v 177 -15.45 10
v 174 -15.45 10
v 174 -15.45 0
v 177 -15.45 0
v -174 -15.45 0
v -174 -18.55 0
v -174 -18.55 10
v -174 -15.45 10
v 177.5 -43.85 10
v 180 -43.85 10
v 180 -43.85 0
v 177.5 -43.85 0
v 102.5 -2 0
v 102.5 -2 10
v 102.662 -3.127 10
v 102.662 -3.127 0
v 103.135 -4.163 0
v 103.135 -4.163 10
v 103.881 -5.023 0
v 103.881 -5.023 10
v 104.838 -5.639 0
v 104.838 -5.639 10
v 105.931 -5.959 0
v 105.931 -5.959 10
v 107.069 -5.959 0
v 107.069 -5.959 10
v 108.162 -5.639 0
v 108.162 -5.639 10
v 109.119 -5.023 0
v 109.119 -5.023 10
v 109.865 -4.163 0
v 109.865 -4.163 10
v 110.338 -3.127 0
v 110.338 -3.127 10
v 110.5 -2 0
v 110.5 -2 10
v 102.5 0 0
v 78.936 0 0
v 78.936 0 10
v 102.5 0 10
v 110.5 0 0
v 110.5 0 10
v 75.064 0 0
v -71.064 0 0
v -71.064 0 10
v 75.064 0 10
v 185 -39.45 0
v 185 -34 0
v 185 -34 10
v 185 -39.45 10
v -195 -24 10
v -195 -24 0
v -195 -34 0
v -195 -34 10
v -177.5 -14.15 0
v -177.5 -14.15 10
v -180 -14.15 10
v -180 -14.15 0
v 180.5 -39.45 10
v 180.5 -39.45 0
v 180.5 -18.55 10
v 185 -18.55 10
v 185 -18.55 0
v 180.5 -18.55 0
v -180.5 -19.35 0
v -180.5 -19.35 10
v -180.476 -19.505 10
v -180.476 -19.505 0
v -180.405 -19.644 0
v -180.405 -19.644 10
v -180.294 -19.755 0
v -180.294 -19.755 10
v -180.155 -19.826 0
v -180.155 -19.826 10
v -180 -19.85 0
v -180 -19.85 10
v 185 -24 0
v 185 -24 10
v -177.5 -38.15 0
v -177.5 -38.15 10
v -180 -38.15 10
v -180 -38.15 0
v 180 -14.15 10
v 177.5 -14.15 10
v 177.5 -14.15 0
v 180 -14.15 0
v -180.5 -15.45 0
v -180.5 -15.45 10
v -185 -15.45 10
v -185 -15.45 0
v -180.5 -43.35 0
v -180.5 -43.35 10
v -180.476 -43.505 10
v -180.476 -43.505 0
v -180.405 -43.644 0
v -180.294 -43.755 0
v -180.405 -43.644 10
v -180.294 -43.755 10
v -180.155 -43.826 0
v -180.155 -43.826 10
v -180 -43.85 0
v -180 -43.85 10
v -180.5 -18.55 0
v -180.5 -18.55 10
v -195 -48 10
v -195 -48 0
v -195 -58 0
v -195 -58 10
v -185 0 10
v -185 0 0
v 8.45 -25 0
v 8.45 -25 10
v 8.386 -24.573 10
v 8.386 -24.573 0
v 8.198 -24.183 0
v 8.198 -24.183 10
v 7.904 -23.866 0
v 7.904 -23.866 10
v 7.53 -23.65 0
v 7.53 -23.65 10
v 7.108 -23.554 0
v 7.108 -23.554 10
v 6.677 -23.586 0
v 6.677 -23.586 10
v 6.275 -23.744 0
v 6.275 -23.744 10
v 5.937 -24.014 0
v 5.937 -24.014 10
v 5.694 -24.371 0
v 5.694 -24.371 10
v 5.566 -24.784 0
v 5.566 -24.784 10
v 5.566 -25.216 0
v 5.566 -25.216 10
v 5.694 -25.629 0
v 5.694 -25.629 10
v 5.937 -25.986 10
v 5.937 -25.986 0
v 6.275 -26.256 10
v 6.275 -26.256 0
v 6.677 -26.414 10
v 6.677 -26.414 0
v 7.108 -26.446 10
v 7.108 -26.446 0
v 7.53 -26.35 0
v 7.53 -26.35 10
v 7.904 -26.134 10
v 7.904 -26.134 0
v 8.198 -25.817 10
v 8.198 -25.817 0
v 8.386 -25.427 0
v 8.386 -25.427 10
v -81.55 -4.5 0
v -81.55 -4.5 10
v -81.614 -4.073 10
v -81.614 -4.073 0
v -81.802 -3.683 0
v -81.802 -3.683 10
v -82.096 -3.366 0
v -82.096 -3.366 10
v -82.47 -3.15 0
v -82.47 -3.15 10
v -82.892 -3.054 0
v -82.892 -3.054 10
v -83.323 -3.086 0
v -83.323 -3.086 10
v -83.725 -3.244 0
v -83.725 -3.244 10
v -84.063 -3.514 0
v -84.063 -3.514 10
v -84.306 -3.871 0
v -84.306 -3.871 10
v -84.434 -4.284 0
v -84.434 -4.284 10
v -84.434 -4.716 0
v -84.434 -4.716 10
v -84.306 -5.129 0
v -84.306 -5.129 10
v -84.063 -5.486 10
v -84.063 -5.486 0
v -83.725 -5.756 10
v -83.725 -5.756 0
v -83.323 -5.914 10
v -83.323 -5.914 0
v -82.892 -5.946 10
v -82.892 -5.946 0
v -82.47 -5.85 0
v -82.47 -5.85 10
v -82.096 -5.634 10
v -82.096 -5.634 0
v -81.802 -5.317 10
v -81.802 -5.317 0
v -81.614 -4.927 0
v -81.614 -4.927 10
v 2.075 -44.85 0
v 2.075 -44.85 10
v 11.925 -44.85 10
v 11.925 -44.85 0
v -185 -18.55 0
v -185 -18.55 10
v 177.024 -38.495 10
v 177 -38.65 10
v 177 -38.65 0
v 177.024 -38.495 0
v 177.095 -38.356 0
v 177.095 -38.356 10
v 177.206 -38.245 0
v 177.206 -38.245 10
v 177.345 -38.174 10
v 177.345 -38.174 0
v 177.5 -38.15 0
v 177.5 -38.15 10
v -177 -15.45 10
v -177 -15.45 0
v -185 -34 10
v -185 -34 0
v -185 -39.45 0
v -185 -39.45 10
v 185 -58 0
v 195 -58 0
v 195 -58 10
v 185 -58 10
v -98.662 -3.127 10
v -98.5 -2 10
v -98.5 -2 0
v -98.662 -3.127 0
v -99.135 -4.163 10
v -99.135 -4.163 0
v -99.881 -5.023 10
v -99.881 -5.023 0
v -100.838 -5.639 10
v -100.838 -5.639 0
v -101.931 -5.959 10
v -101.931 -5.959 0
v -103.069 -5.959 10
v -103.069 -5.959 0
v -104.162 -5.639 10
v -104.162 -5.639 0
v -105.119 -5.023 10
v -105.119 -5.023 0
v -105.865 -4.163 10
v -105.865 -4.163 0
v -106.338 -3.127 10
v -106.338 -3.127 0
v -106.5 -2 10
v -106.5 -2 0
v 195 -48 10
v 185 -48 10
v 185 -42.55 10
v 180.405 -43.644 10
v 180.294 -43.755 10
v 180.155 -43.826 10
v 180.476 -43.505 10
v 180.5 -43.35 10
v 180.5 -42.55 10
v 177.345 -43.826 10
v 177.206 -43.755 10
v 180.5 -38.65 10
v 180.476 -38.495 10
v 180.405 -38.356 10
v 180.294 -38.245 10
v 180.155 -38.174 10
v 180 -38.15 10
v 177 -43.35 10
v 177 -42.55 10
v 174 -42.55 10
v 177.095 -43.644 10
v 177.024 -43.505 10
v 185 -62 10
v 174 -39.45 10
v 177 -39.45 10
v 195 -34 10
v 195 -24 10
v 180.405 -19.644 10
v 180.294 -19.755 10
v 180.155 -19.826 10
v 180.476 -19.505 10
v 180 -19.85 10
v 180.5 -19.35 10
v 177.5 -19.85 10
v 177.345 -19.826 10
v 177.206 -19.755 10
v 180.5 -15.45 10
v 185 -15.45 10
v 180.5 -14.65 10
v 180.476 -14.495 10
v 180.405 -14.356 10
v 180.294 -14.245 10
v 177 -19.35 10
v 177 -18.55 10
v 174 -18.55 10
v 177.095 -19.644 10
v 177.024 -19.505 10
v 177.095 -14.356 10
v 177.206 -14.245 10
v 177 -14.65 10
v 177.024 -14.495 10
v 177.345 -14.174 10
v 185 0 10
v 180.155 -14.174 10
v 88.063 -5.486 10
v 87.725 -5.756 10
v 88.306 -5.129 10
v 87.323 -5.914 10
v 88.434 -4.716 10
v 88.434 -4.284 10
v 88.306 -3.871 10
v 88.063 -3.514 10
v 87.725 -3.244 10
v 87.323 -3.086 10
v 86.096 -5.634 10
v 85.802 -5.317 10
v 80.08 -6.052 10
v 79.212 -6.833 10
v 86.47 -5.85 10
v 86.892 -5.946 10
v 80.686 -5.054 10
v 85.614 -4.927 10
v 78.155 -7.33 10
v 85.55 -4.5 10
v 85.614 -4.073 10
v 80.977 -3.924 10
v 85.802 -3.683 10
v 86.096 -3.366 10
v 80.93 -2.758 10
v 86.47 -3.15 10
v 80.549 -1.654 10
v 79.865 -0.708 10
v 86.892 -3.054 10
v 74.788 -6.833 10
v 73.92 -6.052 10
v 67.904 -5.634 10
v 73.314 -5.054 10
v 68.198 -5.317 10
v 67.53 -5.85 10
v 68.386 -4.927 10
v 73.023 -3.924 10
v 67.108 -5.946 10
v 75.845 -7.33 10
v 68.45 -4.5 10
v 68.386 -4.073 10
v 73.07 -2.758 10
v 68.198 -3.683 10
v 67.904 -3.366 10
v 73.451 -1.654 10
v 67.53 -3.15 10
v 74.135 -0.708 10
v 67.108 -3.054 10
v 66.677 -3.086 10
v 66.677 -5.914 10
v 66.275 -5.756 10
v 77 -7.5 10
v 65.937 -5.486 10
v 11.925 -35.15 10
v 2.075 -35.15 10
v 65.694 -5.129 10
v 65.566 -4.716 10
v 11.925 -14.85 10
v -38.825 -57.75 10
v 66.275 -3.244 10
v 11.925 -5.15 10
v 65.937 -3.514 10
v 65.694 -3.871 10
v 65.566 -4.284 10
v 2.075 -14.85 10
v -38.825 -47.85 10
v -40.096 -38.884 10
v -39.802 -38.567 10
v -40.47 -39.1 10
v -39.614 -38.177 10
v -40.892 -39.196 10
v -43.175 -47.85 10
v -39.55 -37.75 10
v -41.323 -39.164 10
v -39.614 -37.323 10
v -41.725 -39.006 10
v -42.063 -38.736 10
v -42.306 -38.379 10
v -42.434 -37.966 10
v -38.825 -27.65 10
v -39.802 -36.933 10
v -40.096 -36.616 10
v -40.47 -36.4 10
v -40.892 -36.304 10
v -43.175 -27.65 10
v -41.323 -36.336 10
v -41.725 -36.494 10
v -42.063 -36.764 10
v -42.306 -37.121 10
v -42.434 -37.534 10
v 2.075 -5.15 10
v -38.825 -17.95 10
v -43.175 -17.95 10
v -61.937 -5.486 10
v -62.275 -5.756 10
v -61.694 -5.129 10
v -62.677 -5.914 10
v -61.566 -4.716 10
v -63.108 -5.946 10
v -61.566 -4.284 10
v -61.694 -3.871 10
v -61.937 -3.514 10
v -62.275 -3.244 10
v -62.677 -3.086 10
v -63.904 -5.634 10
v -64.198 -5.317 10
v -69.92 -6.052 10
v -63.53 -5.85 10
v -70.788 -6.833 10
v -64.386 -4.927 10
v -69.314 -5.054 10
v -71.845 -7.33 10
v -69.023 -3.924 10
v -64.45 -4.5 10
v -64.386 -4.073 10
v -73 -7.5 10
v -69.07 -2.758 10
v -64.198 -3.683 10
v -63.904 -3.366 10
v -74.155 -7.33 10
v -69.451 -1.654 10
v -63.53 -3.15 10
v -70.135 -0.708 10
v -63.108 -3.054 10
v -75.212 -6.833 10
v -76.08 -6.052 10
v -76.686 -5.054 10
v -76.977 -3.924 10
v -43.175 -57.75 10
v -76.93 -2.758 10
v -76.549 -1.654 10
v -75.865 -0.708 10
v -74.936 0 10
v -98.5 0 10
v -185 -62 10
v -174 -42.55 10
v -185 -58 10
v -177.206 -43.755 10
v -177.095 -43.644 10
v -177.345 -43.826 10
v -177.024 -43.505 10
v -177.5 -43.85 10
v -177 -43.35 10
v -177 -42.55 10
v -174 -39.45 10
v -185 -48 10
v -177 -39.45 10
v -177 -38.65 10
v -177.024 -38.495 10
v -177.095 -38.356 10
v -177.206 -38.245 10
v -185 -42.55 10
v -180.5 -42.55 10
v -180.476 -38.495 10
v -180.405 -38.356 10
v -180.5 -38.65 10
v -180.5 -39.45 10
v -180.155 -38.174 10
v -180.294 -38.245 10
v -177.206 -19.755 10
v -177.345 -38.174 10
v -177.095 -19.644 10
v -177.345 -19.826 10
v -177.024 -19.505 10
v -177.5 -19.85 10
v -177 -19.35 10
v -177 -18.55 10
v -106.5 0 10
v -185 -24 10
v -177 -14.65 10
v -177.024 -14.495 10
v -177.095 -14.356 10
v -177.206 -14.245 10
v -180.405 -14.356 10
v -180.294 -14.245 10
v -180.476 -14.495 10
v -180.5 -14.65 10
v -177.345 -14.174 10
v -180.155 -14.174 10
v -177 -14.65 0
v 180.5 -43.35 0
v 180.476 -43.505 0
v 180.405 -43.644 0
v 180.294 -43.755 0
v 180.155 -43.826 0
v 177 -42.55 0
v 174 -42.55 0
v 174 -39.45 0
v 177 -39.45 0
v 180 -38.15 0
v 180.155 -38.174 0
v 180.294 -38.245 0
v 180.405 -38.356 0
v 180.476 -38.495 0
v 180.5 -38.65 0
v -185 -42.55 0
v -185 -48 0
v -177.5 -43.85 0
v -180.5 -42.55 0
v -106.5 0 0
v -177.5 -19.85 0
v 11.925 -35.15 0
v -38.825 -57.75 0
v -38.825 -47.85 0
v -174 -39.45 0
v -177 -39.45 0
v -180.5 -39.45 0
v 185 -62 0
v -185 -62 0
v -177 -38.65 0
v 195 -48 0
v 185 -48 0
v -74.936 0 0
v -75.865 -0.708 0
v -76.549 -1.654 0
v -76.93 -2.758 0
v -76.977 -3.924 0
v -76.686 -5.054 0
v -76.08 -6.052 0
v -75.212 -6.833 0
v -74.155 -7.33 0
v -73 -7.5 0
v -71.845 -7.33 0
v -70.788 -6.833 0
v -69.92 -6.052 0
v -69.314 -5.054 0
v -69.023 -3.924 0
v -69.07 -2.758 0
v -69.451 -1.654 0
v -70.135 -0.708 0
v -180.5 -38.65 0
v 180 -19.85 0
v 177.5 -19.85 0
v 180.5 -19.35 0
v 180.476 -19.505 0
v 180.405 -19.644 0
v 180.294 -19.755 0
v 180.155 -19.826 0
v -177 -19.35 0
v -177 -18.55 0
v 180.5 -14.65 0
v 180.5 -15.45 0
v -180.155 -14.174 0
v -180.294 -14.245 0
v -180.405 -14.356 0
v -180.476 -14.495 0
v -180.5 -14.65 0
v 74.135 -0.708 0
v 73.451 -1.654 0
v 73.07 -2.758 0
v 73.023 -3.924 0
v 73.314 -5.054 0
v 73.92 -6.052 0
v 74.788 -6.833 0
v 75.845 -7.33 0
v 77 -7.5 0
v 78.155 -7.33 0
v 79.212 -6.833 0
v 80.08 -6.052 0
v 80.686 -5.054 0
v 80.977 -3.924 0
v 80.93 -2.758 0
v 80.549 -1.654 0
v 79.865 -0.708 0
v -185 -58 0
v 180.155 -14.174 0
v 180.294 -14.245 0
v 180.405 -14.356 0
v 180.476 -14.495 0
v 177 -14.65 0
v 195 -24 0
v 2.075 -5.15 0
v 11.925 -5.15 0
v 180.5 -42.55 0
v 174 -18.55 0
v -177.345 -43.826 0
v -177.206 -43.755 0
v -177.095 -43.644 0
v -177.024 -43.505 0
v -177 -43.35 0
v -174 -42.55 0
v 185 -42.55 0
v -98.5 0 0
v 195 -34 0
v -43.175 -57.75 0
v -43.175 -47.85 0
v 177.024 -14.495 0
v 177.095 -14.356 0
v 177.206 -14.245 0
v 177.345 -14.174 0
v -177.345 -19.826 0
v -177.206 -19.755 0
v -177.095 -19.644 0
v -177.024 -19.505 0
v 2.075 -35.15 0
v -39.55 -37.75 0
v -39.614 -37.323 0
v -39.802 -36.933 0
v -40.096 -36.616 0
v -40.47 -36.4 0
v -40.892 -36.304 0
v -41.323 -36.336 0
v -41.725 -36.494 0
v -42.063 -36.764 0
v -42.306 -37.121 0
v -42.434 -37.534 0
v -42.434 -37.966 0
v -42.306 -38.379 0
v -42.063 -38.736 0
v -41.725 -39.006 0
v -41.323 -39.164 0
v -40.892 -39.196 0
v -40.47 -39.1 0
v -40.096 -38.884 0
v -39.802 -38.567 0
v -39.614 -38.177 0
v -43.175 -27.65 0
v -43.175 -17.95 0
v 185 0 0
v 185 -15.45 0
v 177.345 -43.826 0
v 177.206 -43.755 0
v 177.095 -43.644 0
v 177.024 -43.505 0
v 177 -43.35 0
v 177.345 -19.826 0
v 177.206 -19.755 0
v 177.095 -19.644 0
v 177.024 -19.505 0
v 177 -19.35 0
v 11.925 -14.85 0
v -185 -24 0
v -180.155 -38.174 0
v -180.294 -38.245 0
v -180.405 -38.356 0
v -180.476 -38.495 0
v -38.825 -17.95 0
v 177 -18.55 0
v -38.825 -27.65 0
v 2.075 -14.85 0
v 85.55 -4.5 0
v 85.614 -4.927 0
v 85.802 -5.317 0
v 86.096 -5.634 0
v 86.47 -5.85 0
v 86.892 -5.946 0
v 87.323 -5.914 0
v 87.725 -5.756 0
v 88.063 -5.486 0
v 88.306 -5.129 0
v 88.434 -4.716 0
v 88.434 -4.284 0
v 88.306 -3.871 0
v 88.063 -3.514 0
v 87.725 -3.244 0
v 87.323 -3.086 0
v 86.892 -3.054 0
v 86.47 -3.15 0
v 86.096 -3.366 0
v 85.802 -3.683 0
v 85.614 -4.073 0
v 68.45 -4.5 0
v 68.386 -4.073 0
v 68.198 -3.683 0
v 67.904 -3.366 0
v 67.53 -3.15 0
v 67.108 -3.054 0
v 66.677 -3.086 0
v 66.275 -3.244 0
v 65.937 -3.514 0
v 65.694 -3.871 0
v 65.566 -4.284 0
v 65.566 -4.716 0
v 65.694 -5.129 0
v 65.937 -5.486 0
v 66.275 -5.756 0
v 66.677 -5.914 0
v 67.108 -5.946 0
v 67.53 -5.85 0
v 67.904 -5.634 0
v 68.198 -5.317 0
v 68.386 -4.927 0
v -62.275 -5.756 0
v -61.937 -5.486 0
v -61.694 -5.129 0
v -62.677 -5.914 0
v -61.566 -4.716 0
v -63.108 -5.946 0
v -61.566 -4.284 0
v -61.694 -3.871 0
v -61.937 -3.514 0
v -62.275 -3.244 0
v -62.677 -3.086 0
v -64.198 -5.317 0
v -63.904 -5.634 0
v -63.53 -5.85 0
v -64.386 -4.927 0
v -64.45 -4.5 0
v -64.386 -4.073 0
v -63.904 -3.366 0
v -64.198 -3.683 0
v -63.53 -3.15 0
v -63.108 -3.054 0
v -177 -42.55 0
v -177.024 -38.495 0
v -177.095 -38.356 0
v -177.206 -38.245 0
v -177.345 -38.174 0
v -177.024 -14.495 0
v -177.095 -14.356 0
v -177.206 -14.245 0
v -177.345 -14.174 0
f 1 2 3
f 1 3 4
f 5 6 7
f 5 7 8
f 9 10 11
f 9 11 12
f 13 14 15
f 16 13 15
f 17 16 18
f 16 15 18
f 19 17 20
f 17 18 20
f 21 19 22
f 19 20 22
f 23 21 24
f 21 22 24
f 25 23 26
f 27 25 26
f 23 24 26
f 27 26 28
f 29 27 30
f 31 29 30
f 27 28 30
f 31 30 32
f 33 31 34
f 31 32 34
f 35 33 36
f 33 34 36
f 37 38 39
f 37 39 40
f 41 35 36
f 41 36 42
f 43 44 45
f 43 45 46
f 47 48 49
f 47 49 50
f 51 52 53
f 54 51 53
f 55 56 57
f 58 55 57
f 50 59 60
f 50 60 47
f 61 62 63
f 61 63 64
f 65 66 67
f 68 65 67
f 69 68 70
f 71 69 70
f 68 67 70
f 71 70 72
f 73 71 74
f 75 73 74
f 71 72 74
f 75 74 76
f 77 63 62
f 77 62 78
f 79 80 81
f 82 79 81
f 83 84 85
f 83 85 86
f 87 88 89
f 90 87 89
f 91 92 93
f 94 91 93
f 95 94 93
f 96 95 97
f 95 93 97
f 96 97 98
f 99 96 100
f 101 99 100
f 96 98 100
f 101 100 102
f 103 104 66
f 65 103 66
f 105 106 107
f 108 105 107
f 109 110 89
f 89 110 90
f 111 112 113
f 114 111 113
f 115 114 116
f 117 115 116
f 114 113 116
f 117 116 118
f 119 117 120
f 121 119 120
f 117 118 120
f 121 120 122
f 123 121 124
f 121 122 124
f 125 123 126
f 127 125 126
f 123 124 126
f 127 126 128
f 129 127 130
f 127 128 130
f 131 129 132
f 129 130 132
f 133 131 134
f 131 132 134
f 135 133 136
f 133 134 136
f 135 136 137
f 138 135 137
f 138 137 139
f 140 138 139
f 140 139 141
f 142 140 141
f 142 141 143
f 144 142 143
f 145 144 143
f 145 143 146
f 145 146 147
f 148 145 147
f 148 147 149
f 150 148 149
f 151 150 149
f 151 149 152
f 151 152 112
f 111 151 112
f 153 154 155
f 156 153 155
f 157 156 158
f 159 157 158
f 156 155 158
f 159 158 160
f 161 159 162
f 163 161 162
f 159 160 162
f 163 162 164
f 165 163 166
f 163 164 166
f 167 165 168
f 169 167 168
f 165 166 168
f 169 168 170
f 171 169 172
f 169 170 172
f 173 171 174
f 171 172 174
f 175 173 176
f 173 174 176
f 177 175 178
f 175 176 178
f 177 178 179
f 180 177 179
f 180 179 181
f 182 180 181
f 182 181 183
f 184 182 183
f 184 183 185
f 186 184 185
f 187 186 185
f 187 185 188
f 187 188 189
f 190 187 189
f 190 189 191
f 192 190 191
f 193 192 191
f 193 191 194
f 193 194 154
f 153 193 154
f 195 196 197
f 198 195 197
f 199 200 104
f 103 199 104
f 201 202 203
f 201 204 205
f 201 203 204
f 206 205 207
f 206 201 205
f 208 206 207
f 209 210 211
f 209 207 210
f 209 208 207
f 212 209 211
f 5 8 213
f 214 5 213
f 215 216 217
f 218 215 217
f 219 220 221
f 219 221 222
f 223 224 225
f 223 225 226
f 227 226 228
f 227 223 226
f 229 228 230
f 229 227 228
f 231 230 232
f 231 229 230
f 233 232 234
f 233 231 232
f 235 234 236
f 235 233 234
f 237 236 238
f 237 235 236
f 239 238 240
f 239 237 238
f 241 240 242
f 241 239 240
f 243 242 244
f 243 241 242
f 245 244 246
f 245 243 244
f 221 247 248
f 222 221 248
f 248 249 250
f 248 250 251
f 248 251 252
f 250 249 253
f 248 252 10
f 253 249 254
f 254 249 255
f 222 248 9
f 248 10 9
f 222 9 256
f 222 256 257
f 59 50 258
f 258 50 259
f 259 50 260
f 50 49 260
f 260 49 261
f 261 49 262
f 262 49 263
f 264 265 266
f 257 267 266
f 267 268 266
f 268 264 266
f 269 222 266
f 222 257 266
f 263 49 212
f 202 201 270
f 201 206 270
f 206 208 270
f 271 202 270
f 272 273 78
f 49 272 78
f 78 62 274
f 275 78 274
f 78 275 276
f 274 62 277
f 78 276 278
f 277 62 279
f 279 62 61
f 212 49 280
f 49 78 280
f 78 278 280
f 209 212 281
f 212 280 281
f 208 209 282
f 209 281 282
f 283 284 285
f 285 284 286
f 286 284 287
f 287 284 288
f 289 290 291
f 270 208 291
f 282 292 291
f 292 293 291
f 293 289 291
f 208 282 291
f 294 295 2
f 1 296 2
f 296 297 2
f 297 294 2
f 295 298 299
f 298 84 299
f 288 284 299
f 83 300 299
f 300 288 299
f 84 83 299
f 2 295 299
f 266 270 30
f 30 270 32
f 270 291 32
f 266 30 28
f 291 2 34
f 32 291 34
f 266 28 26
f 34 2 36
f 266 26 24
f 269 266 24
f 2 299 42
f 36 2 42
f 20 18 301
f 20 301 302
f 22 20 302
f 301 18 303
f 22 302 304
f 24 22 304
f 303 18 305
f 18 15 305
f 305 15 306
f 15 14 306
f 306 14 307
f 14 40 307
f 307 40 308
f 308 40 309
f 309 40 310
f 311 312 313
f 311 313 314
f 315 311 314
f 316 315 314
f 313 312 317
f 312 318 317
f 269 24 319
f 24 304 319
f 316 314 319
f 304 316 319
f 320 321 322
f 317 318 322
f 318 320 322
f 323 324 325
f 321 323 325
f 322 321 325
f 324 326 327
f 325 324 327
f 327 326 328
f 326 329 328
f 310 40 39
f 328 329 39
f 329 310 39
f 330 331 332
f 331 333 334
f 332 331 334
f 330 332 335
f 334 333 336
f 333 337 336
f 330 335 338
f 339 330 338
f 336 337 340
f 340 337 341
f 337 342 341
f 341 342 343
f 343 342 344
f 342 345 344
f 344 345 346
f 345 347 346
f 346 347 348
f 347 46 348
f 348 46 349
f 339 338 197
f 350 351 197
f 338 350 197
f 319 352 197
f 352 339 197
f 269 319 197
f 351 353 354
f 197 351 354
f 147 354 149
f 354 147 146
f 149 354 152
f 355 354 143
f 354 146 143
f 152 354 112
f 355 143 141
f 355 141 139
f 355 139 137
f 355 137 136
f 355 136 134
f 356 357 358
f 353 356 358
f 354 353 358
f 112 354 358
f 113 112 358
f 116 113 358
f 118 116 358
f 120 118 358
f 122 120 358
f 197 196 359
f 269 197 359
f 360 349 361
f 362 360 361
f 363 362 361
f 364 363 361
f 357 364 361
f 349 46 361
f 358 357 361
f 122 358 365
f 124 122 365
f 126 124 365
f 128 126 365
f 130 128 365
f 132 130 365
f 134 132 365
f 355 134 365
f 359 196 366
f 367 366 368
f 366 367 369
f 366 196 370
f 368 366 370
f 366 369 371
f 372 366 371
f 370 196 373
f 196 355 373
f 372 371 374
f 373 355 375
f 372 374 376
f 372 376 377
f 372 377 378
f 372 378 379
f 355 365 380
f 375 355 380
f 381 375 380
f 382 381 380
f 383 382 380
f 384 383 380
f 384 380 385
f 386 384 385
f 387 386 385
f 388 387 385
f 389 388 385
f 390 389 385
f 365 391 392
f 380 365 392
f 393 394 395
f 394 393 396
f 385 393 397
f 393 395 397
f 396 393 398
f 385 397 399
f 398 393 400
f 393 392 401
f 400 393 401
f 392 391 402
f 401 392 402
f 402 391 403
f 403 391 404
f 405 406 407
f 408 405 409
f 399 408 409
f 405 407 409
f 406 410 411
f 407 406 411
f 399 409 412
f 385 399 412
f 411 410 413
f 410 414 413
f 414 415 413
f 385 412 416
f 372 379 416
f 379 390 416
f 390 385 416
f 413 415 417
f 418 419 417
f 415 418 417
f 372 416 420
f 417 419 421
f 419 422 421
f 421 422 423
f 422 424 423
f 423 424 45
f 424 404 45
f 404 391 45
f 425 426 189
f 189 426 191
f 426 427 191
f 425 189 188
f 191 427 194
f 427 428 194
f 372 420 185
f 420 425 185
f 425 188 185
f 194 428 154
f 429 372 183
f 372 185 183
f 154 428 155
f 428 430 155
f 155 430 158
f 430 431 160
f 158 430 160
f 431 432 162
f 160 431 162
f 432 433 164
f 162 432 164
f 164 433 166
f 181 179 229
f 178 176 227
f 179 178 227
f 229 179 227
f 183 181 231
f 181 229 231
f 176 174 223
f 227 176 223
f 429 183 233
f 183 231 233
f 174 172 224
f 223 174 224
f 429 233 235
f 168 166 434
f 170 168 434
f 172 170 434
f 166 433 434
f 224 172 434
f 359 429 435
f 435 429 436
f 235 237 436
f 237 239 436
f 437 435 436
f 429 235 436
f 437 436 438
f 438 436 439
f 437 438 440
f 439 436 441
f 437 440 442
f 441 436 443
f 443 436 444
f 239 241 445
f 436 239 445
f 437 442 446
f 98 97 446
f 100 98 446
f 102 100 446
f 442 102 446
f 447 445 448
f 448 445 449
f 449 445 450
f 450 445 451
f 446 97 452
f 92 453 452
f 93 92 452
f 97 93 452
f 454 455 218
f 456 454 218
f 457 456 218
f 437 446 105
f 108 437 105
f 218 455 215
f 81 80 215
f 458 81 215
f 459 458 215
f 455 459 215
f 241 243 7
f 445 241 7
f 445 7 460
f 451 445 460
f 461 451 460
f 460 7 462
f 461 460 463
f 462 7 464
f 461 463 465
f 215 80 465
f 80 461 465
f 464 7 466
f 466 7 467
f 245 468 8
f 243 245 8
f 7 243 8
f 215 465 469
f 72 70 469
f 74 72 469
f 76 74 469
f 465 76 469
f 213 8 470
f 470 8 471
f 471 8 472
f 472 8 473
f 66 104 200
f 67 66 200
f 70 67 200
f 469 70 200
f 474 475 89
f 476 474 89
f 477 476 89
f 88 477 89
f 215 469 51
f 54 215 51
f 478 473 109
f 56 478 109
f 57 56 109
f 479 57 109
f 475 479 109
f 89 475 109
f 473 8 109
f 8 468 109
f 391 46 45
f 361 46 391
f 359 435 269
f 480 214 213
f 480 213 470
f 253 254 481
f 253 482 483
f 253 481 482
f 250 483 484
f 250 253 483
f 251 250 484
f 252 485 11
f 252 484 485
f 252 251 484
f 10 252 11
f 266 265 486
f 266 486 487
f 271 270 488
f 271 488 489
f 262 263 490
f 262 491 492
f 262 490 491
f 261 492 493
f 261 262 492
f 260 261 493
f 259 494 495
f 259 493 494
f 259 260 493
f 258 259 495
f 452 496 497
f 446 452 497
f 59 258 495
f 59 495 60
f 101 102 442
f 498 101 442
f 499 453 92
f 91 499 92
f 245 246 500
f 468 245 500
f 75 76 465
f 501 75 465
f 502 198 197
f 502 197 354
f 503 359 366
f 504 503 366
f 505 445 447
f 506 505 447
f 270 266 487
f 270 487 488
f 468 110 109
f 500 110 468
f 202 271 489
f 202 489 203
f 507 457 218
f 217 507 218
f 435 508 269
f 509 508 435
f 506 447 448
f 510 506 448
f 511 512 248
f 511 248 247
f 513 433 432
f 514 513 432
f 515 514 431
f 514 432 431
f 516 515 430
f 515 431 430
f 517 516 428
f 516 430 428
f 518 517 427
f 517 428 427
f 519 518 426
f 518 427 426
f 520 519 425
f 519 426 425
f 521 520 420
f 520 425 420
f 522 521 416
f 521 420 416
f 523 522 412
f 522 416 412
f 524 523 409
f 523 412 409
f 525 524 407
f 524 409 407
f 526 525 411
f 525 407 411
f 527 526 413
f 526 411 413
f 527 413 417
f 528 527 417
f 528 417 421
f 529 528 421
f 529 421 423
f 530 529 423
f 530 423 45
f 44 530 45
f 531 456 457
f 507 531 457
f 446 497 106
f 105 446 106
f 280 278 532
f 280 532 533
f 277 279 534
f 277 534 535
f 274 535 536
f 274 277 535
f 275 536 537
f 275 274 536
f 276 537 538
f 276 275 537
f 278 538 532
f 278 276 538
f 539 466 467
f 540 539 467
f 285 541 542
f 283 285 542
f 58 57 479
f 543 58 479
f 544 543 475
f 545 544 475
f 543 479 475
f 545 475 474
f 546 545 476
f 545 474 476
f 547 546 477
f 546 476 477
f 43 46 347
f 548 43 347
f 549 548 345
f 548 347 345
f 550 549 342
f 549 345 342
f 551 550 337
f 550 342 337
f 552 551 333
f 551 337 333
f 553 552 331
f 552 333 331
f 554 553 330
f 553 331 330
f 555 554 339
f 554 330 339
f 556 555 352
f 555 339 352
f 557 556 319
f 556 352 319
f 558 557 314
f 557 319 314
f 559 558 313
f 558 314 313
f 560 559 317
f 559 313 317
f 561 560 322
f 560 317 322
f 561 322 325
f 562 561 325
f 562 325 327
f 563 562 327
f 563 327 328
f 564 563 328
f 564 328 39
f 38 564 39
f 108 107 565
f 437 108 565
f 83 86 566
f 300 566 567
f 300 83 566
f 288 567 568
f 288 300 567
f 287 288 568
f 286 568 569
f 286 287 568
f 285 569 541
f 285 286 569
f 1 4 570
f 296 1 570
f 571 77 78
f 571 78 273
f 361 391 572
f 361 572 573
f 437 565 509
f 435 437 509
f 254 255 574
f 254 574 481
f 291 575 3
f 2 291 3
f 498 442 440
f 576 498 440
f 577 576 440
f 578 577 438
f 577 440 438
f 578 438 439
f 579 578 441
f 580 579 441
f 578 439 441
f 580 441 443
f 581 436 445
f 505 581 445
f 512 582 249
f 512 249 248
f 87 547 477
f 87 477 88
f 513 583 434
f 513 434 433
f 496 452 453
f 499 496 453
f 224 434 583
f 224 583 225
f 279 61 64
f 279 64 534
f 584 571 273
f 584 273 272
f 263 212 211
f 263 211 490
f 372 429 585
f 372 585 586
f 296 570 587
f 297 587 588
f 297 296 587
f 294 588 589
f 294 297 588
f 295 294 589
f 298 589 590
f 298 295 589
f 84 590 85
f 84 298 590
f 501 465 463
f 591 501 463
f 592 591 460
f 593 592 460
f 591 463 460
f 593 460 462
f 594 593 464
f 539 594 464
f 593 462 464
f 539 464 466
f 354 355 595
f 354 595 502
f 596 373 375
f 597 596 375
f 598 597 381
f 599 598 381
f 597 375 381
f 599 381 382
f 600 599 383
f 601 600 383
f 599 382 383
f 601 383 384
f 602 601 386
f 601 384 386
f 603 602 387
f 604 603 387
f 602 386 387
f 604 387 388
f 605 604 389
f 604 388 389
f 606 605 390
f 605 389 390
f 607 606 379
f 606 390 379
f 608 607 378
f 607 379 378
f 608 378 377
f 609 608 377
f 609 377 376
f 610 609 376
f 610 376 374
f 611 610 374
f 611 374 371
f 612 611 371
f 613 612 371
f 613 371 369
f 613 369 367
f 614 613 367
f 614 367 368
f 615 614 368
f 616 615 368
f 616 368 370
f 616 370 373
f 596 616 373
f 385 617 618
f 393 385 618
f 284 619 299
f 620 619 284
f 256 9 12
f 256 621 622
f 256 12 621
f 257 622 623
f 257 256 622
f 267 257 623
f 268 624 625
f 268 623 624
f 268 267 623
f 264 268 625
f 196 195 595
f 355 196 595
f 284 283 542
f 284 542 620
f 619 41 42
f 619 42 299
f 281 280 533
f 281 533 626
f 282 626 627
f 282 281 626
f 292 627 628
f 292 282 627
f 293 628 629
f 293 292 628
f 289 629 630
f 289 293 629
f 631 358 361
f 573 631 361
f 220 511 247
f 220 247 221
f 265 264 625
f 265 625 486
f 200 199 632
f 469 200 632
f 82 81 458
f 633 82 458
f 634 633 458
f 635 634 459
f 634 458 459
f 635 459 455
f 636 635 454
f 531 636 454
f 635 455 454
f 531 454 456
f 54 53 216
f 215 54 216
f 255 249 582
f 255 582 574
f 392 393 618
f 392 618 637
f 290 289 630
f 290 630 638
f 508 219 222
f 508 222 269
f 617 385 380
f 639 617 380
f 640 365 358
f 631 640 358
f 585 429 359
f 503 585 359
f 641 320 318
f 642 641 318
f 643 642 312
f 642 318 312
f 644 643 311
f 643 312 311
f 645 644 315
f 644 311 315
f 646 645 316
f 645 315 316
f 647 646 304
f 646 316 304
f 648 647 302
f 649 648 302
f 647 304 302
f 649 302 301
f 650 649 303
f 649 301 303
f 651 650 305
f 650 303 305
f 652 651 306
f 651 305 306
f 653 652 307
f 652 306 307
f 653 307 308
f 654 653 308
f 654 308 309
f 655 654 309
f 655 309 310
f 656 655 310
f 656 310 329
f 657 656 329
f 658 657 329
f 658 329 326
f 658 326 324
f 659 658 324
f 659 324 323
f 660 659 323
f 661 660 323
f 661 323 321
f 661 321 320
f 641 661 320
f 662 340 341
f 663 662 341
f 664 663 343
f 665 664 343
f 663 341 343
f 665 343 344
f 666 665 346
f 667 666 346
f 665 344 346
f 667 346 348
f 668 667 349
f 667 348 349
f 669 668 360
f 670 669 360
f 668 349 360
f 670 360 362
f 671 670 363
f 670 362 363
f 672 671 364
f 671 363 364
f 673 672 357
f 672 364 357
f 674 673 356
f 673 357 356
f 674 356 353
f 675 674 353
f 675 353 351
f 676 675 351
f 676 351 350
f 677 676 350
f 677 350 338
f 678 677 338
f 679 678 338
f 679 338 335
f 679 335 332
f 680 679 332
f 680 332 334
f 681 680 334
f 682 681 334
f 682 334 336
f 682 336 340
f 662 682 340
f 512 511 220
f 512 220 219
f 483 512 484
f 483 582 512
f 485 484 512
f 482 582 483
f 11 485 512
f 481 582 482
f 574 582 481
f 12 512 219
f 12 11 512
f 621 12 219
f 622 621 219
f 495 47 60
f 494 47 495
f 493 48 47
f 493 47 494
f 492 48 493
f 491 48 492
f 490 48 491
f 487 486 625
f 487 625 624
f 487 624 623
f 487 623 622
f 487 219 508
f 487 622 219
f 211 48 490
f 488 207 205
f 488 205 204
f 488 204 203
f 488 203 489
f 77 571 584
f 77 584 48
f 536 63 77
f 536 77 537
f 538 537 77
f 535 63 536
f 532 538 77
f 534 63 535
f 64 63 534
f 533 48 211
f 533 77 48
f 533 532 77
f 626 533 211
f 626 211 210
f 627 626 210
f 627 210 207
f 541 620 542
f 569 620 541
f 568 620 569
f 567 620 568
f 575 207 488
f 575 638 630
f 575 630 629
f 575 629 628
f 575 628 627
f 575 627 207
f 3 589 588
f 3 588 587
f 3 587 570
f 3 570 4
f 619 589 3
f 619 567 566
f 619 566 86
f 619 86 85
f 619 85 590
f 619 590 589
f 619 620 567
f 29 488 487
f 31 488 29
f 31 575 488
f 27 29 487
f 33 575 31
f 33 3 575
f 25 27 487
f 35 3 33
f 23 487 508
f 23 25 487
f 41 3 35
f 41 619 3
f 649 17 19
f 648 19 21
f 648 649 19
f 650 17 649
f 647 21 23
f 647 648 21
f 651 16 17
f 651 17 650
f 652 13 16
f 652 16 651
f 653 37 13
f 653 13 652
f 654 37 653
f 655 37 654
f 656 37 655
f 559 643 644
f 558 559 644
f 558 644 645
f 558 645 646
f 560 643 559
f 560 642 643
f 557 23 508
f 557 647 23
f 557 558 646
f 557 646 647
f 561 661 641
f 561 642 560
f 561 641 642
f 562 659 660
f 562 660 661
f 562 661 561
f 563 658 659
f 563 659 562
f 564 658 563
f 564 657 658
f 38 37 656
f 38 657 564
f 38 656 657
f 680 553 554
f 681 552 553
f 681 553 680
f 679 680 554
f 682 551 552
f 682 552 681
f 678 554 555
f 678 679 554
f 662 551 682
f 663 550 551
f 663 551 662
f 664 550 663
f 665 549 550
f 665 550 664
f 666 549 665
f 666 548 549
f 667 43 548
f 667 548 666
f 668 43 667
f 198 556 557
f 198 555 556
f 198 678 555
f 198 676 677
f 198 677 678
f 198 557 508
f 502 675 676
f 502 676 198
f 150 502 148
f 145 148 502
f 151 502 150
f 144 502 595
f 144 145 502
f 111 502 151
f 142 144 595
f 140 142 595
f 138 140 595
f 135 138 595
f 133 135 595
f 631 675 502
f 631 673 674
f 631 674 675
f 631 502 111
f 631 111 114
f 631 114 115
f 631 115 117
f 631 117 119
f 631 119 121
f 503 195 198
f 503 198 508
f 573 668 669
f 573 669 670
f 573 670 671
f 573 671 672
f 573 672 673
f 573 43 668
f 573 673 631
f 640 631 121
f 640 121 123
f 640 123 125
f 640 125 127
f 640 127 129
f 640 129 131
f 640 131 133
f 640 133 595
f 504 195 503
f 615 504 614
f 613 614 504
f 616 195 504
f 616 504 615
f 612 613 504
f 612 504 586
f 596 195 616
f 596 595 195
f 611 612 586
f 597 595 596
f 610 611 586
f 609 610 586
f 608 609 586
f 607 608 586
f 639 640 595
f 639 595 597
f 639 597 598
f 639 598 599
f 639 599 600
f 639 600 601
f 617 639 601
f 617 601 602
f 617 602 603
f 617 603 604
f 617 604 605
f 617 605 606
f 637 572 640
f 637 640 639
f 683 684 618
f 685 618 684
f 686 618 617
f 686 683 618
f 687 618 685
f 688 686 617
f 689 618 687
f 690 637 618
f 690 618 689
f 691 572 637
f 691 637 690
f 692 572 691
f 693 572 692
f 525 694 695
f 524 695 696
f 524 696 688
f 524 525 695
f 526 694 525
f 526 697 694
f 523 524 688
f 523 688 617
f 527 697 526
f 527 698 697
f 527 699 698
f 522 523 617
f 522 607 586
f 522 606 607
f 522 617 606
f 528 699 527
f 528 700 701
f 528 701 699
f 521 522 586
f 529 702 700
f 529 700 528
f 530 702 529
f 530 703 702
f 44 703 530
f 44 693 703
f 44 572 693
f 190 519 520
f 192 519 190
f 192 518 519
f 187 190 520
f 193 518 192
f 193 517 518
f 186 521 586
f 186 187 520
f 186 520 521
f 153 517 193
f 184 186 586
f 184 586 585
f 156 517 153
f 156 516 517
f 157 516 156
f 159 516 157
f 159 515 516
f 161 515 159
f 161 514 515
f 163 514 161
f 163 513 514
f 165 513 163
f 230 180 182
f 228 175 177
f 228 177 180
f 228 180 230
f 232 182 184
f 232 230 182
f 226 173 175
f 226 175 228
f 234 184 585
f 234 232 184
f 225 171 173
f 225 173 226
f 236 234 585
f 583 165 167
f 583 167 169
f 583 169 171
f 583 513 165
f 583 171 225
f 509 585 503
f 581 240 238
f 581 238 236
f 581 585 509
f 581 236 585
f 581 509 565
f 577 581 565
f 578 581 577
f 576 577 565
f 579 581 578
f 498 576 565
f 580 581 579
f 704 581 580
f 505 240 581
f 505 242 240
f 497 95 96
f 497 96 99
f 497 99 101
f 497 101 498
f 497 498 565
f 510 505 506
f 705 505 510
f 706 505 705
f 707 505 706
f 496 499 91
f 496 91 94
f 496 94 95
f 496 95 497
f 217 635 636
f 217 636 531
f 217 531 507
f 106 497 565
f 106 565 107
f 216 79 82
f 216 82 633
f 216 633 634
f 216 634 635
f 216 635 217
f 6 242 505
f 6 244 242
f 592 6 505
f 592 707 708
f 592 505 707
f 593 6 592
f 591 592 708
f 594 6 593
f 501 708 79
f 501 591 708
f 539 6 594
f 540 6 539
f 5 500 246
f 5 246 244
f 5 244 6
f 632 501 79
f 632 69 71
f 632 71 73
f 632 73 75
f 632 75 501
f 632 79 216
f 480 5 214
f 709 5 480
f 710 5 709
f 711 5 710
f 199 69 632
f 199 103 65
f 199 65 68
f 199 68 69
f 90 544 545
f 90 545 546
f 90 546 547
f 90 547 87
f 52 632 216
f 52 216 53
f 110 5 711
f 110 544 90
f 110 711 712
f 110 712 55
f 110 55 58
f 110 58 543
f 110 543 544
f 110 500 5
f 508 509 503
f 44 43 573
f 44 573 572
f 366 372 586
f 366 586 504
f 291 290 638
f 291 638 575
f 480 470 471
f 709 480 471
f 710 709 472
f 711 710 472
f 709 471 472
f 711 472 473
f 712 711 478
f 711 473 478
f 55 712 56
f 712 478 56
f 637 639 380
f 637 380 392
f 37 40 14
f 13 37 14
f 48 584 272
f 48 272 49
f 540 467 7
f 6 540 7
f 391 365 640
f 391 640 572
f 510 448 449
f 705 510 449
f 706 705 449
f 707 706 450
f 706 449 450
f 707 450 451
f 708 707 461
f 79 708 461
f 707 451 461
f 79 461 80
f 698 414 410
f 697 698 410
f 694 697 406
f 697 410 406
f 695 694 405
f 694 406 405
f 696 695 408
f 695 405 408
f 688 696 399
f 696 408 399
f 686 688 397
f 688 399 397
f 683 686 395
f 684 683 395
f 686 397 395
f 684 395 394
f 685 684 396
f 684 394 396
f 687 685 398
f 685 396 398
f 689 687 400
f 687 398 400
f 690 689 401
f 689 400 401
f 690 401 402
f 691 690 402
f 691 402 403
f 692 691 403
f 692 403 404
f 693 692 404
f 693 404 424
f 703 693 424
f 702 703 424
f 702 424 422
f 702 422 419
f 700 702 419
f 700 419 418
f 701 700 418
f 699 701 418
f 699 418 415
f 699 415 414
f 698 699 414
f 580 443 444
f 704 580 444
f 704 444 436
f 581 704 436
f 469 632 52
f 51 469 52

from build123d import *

# Parameters (mm, degrees)
MAINBODY_DEPTH      = 10
SCREWCUTOUTS_DEPTH  = 205.863369102
SKETCH2_R           = 4
SKETCH2_R_2         = 1.45
RODCUTOUTS_DEPTH    = 205.863369102
SKETCH4_R           = 1.45
SKETCH4_W           = 9.85
SKETCH4_H           = 9.7
CUT_EXTRUDE3_DEPTH  = 205.863369102
SKETCH5_R           = 1.45
SKETCH5_W           = 4.35
SKETCH5_H           = 9.7
SKETCH5_H_2         = 9.9
ENDSTOPHOLDER_DEPTH = 205.863369102
CUT_EXTRUDE4_DEPTH  = 205.863369102


with BuildPart() as part:
    # Sketch1 → MainBody (new body)
    with BuildSketch(Plane.XY):
        Polygon((0, 0), (-185, 0), (-185, -24), (-195, -24), (-195, -34), (-185, -34), (-185, -48), (-195, -48), (-195, -58), (-185, -58), (-185, -62), (0, -62), align=None)
    mainbody = extrude(amount=MAINBODY_DEPTH)

    # Sketch3 → ScrewCutouts (cut, through all)
    with BuildSketch(Plane.XY.offset(10)):
        with BuildLine():
            Line((-185, -18.55), (-180.5, -18.55))
            Line((-180.5, -18.55), (-180.5, -19.35))
            ThreePointArc((-180.5, -19.35), (-180.353553391, -19.703553391), (-180, -19.85))
            Line((-180, -19.85), (-177.5, -19.85))
            ThreePointArc((-177.5, -19.85), (-177.146446609, -19.703553391), (-177, -19.35))
            Line((-177, -19.35), (-177, -18.55))
            Line((-177, -18.55), (-174, -18.55))
            Line((-174, -18.55), (-174, -15.45))
            Line((-174, -15.45), (-177, -15.45))
            Line((-177, -15.45), (-177, -14.65))
            ThreePointArc((-177, -14.65), (-177.146446609, -14.296446609), (-177.5, -14.15))
            Line((-177.5, -14.15), (-180, -14.15))
            ThreePointArc((-180, -14.15), (-180.353553391, -14.296446609), (-180.5, -14.65))
            Line((-180.5, -14.65), (-180.5, -15.45))
            Line((-180.5, -15.45), (-185, -15.45))
            Line((-185, -15.45), (-185, -18.55))
        make_face()
        with BuildLine():
            Line((-185, -39.45), (-185, -42.55))
            Line((-185, -42.55), (-180.5, -42.55))
            Line((-180.5, -42.55), (-180.5, -43.35))
            ThreePointArc((-180.5, -43.35), (-180.353553391, -43.703553391), (-180, -43.85))
            Line((-180, -43.85), (-177.5, -43.85))
            ThreePointArc((-177.5, -43.85), (-177.146446609, -43.703553391), (-177, -43.35))
            Line((-177, -43.35), (-177, -42.55))
            Line((-177, -42.55), (-174, -42.55))
            Line((-174, -42.55), (-174, -39.45))
            Line((-174, -39.45), (-177, -39.45))
            Line((-177, -39.45), (-177, -38.65))
            ThreePointArc((-177, -38.65), (-177.146446609, -38.296446609), (-177.5, -38.15))
            Line((-177.5, -38.15), (-180, -38.15))
            ThreePointArc((-180, -38.15), (-180.353553391, -38.296446609), (-180.5, -38.65))
            Line((-180.5, -38.65), (-180.5, -39.45))
            Line((-180.5, -39.45), (-185, -39.45))
        make_face()
    screwcutouts = extrude(amount=-SCREWCUTOUTS_DEPTH, mode=Mode.SUBTRACT)

    # Mirror1: MainBody, ScrewCutouts across plane
    add(mainbody.mirror(Plane(origin=(0, 0, 0), x_dir=(0, 0, 1), z_dir=(1, 0, 0))))
    add(screwcutouts.mirror(Plane(origin=(0, 0, 0), x_dir=(0, 0, 1), z_dir=(1, 0, 0))), mode=Mode.SUBTRACT)

    # Sketch2 → RodCutouts (cut, through all)
    with BuildSketch(Plane.XY.offset(10)):
        with Locations((-73, -3.5)):
            Circle(SKETCH2_R)
        with Locations((-83, -4.5)):
            Circle(SKETCH2_R_2)
        with Locations(Location((-63, -4.5, 0), (0, 0, 180))):
            Circle(SKETCH2_R_2)
        with Locations((67, -4.5)):
            Circle(SKETCH2_R_2)
        with Locations(Location((87, -4.5, 0), (0, 0, 180))):
            Circle(SKETCH2_R_2)
        with Locations((77, -3.5)):
            Circle(SKETCH2_R)
    extrude(amount=-RODCUTOUTS_DEPTH, mode=Mode.SUBTRACT)

    # Sketch4 → Cut-Extrude3 (cut, through all)
    with BuildSketch(Plane.XY.offset(10)):
        with Locations((7, -25)):
            Circle(SKETCH4_R)
        with Locations((7, -10)):
            Rectangle(SKETCH4_W, SKETCH4_H)
        with Locations((7, -40)):
            Rectangle(SKETCH4_W, SKETCH4_H)
    extrude(amount=-CUT_EXTRUDE3_DEPTH, mode=Mode.SUBTRACT)

    # Sketch5 → EndstopHolder (cut, through all)
    with BuildSketch(Plane.XY.offset(10)):
        with Locations((-41, -37.75)):
            Circle(SKETCH5_R)
        with Locations((-41, -22.8)):
            Rectangle(SKETCH5_W, SKETCH5_H)
        with Locations((-41, -52.8)):
            Rectangle(SKETCH5_W, SKETCH5_H_2)
        with BuildLine():
            Line((-31.425, 8.994431211), (-31.425, 5))
            ThreePointArc((-31.425, 5), (-34.625, 1.8), (-37.825, 5))
            Line((-37.825, 5), (-37.825, 8.994431211))
            ThreePointArc((-37.825, 8.994431211), (-34.625, 12.194431211), (-31.425, 8.994431211))
        make_face()
    extrude(amount=-ENDSTOPHOLDER_DEPTH, mode=Mode.SUBTRACT)

    # Sketch7 → Cut-Extrude4 (cut, through all)
    with BuildSketch(Plane.XY.offset(10)):
        with BuildLine():
            Line((-98.5, 0), (-98.5, -2))
            ThreePointArc((-98.5, -2), (-102.5, -6), (-106.5, -2))
            Line((-106.5, -2), (-106.5, 0))
            ThreePointArc((-106.5, 0), (-102.5, 4), (-98.5, 0))
        make_face()
        with BuildLine():
            Line((102.5, 0), (102.5, -2))
            ThreePointArc((102.5, -2), (106.5, -6), (110.5, -2))
            Line((110.5, -2), (110.5, 0))
            ThreePointArc((110.5, 0), (106.5, 4), (102.5, 0))
        make_face()
    extrude(amount=-CUT_EXTRUDE4_DEPTH, mode=Mode.SUBTRACT)


solid = part.part
